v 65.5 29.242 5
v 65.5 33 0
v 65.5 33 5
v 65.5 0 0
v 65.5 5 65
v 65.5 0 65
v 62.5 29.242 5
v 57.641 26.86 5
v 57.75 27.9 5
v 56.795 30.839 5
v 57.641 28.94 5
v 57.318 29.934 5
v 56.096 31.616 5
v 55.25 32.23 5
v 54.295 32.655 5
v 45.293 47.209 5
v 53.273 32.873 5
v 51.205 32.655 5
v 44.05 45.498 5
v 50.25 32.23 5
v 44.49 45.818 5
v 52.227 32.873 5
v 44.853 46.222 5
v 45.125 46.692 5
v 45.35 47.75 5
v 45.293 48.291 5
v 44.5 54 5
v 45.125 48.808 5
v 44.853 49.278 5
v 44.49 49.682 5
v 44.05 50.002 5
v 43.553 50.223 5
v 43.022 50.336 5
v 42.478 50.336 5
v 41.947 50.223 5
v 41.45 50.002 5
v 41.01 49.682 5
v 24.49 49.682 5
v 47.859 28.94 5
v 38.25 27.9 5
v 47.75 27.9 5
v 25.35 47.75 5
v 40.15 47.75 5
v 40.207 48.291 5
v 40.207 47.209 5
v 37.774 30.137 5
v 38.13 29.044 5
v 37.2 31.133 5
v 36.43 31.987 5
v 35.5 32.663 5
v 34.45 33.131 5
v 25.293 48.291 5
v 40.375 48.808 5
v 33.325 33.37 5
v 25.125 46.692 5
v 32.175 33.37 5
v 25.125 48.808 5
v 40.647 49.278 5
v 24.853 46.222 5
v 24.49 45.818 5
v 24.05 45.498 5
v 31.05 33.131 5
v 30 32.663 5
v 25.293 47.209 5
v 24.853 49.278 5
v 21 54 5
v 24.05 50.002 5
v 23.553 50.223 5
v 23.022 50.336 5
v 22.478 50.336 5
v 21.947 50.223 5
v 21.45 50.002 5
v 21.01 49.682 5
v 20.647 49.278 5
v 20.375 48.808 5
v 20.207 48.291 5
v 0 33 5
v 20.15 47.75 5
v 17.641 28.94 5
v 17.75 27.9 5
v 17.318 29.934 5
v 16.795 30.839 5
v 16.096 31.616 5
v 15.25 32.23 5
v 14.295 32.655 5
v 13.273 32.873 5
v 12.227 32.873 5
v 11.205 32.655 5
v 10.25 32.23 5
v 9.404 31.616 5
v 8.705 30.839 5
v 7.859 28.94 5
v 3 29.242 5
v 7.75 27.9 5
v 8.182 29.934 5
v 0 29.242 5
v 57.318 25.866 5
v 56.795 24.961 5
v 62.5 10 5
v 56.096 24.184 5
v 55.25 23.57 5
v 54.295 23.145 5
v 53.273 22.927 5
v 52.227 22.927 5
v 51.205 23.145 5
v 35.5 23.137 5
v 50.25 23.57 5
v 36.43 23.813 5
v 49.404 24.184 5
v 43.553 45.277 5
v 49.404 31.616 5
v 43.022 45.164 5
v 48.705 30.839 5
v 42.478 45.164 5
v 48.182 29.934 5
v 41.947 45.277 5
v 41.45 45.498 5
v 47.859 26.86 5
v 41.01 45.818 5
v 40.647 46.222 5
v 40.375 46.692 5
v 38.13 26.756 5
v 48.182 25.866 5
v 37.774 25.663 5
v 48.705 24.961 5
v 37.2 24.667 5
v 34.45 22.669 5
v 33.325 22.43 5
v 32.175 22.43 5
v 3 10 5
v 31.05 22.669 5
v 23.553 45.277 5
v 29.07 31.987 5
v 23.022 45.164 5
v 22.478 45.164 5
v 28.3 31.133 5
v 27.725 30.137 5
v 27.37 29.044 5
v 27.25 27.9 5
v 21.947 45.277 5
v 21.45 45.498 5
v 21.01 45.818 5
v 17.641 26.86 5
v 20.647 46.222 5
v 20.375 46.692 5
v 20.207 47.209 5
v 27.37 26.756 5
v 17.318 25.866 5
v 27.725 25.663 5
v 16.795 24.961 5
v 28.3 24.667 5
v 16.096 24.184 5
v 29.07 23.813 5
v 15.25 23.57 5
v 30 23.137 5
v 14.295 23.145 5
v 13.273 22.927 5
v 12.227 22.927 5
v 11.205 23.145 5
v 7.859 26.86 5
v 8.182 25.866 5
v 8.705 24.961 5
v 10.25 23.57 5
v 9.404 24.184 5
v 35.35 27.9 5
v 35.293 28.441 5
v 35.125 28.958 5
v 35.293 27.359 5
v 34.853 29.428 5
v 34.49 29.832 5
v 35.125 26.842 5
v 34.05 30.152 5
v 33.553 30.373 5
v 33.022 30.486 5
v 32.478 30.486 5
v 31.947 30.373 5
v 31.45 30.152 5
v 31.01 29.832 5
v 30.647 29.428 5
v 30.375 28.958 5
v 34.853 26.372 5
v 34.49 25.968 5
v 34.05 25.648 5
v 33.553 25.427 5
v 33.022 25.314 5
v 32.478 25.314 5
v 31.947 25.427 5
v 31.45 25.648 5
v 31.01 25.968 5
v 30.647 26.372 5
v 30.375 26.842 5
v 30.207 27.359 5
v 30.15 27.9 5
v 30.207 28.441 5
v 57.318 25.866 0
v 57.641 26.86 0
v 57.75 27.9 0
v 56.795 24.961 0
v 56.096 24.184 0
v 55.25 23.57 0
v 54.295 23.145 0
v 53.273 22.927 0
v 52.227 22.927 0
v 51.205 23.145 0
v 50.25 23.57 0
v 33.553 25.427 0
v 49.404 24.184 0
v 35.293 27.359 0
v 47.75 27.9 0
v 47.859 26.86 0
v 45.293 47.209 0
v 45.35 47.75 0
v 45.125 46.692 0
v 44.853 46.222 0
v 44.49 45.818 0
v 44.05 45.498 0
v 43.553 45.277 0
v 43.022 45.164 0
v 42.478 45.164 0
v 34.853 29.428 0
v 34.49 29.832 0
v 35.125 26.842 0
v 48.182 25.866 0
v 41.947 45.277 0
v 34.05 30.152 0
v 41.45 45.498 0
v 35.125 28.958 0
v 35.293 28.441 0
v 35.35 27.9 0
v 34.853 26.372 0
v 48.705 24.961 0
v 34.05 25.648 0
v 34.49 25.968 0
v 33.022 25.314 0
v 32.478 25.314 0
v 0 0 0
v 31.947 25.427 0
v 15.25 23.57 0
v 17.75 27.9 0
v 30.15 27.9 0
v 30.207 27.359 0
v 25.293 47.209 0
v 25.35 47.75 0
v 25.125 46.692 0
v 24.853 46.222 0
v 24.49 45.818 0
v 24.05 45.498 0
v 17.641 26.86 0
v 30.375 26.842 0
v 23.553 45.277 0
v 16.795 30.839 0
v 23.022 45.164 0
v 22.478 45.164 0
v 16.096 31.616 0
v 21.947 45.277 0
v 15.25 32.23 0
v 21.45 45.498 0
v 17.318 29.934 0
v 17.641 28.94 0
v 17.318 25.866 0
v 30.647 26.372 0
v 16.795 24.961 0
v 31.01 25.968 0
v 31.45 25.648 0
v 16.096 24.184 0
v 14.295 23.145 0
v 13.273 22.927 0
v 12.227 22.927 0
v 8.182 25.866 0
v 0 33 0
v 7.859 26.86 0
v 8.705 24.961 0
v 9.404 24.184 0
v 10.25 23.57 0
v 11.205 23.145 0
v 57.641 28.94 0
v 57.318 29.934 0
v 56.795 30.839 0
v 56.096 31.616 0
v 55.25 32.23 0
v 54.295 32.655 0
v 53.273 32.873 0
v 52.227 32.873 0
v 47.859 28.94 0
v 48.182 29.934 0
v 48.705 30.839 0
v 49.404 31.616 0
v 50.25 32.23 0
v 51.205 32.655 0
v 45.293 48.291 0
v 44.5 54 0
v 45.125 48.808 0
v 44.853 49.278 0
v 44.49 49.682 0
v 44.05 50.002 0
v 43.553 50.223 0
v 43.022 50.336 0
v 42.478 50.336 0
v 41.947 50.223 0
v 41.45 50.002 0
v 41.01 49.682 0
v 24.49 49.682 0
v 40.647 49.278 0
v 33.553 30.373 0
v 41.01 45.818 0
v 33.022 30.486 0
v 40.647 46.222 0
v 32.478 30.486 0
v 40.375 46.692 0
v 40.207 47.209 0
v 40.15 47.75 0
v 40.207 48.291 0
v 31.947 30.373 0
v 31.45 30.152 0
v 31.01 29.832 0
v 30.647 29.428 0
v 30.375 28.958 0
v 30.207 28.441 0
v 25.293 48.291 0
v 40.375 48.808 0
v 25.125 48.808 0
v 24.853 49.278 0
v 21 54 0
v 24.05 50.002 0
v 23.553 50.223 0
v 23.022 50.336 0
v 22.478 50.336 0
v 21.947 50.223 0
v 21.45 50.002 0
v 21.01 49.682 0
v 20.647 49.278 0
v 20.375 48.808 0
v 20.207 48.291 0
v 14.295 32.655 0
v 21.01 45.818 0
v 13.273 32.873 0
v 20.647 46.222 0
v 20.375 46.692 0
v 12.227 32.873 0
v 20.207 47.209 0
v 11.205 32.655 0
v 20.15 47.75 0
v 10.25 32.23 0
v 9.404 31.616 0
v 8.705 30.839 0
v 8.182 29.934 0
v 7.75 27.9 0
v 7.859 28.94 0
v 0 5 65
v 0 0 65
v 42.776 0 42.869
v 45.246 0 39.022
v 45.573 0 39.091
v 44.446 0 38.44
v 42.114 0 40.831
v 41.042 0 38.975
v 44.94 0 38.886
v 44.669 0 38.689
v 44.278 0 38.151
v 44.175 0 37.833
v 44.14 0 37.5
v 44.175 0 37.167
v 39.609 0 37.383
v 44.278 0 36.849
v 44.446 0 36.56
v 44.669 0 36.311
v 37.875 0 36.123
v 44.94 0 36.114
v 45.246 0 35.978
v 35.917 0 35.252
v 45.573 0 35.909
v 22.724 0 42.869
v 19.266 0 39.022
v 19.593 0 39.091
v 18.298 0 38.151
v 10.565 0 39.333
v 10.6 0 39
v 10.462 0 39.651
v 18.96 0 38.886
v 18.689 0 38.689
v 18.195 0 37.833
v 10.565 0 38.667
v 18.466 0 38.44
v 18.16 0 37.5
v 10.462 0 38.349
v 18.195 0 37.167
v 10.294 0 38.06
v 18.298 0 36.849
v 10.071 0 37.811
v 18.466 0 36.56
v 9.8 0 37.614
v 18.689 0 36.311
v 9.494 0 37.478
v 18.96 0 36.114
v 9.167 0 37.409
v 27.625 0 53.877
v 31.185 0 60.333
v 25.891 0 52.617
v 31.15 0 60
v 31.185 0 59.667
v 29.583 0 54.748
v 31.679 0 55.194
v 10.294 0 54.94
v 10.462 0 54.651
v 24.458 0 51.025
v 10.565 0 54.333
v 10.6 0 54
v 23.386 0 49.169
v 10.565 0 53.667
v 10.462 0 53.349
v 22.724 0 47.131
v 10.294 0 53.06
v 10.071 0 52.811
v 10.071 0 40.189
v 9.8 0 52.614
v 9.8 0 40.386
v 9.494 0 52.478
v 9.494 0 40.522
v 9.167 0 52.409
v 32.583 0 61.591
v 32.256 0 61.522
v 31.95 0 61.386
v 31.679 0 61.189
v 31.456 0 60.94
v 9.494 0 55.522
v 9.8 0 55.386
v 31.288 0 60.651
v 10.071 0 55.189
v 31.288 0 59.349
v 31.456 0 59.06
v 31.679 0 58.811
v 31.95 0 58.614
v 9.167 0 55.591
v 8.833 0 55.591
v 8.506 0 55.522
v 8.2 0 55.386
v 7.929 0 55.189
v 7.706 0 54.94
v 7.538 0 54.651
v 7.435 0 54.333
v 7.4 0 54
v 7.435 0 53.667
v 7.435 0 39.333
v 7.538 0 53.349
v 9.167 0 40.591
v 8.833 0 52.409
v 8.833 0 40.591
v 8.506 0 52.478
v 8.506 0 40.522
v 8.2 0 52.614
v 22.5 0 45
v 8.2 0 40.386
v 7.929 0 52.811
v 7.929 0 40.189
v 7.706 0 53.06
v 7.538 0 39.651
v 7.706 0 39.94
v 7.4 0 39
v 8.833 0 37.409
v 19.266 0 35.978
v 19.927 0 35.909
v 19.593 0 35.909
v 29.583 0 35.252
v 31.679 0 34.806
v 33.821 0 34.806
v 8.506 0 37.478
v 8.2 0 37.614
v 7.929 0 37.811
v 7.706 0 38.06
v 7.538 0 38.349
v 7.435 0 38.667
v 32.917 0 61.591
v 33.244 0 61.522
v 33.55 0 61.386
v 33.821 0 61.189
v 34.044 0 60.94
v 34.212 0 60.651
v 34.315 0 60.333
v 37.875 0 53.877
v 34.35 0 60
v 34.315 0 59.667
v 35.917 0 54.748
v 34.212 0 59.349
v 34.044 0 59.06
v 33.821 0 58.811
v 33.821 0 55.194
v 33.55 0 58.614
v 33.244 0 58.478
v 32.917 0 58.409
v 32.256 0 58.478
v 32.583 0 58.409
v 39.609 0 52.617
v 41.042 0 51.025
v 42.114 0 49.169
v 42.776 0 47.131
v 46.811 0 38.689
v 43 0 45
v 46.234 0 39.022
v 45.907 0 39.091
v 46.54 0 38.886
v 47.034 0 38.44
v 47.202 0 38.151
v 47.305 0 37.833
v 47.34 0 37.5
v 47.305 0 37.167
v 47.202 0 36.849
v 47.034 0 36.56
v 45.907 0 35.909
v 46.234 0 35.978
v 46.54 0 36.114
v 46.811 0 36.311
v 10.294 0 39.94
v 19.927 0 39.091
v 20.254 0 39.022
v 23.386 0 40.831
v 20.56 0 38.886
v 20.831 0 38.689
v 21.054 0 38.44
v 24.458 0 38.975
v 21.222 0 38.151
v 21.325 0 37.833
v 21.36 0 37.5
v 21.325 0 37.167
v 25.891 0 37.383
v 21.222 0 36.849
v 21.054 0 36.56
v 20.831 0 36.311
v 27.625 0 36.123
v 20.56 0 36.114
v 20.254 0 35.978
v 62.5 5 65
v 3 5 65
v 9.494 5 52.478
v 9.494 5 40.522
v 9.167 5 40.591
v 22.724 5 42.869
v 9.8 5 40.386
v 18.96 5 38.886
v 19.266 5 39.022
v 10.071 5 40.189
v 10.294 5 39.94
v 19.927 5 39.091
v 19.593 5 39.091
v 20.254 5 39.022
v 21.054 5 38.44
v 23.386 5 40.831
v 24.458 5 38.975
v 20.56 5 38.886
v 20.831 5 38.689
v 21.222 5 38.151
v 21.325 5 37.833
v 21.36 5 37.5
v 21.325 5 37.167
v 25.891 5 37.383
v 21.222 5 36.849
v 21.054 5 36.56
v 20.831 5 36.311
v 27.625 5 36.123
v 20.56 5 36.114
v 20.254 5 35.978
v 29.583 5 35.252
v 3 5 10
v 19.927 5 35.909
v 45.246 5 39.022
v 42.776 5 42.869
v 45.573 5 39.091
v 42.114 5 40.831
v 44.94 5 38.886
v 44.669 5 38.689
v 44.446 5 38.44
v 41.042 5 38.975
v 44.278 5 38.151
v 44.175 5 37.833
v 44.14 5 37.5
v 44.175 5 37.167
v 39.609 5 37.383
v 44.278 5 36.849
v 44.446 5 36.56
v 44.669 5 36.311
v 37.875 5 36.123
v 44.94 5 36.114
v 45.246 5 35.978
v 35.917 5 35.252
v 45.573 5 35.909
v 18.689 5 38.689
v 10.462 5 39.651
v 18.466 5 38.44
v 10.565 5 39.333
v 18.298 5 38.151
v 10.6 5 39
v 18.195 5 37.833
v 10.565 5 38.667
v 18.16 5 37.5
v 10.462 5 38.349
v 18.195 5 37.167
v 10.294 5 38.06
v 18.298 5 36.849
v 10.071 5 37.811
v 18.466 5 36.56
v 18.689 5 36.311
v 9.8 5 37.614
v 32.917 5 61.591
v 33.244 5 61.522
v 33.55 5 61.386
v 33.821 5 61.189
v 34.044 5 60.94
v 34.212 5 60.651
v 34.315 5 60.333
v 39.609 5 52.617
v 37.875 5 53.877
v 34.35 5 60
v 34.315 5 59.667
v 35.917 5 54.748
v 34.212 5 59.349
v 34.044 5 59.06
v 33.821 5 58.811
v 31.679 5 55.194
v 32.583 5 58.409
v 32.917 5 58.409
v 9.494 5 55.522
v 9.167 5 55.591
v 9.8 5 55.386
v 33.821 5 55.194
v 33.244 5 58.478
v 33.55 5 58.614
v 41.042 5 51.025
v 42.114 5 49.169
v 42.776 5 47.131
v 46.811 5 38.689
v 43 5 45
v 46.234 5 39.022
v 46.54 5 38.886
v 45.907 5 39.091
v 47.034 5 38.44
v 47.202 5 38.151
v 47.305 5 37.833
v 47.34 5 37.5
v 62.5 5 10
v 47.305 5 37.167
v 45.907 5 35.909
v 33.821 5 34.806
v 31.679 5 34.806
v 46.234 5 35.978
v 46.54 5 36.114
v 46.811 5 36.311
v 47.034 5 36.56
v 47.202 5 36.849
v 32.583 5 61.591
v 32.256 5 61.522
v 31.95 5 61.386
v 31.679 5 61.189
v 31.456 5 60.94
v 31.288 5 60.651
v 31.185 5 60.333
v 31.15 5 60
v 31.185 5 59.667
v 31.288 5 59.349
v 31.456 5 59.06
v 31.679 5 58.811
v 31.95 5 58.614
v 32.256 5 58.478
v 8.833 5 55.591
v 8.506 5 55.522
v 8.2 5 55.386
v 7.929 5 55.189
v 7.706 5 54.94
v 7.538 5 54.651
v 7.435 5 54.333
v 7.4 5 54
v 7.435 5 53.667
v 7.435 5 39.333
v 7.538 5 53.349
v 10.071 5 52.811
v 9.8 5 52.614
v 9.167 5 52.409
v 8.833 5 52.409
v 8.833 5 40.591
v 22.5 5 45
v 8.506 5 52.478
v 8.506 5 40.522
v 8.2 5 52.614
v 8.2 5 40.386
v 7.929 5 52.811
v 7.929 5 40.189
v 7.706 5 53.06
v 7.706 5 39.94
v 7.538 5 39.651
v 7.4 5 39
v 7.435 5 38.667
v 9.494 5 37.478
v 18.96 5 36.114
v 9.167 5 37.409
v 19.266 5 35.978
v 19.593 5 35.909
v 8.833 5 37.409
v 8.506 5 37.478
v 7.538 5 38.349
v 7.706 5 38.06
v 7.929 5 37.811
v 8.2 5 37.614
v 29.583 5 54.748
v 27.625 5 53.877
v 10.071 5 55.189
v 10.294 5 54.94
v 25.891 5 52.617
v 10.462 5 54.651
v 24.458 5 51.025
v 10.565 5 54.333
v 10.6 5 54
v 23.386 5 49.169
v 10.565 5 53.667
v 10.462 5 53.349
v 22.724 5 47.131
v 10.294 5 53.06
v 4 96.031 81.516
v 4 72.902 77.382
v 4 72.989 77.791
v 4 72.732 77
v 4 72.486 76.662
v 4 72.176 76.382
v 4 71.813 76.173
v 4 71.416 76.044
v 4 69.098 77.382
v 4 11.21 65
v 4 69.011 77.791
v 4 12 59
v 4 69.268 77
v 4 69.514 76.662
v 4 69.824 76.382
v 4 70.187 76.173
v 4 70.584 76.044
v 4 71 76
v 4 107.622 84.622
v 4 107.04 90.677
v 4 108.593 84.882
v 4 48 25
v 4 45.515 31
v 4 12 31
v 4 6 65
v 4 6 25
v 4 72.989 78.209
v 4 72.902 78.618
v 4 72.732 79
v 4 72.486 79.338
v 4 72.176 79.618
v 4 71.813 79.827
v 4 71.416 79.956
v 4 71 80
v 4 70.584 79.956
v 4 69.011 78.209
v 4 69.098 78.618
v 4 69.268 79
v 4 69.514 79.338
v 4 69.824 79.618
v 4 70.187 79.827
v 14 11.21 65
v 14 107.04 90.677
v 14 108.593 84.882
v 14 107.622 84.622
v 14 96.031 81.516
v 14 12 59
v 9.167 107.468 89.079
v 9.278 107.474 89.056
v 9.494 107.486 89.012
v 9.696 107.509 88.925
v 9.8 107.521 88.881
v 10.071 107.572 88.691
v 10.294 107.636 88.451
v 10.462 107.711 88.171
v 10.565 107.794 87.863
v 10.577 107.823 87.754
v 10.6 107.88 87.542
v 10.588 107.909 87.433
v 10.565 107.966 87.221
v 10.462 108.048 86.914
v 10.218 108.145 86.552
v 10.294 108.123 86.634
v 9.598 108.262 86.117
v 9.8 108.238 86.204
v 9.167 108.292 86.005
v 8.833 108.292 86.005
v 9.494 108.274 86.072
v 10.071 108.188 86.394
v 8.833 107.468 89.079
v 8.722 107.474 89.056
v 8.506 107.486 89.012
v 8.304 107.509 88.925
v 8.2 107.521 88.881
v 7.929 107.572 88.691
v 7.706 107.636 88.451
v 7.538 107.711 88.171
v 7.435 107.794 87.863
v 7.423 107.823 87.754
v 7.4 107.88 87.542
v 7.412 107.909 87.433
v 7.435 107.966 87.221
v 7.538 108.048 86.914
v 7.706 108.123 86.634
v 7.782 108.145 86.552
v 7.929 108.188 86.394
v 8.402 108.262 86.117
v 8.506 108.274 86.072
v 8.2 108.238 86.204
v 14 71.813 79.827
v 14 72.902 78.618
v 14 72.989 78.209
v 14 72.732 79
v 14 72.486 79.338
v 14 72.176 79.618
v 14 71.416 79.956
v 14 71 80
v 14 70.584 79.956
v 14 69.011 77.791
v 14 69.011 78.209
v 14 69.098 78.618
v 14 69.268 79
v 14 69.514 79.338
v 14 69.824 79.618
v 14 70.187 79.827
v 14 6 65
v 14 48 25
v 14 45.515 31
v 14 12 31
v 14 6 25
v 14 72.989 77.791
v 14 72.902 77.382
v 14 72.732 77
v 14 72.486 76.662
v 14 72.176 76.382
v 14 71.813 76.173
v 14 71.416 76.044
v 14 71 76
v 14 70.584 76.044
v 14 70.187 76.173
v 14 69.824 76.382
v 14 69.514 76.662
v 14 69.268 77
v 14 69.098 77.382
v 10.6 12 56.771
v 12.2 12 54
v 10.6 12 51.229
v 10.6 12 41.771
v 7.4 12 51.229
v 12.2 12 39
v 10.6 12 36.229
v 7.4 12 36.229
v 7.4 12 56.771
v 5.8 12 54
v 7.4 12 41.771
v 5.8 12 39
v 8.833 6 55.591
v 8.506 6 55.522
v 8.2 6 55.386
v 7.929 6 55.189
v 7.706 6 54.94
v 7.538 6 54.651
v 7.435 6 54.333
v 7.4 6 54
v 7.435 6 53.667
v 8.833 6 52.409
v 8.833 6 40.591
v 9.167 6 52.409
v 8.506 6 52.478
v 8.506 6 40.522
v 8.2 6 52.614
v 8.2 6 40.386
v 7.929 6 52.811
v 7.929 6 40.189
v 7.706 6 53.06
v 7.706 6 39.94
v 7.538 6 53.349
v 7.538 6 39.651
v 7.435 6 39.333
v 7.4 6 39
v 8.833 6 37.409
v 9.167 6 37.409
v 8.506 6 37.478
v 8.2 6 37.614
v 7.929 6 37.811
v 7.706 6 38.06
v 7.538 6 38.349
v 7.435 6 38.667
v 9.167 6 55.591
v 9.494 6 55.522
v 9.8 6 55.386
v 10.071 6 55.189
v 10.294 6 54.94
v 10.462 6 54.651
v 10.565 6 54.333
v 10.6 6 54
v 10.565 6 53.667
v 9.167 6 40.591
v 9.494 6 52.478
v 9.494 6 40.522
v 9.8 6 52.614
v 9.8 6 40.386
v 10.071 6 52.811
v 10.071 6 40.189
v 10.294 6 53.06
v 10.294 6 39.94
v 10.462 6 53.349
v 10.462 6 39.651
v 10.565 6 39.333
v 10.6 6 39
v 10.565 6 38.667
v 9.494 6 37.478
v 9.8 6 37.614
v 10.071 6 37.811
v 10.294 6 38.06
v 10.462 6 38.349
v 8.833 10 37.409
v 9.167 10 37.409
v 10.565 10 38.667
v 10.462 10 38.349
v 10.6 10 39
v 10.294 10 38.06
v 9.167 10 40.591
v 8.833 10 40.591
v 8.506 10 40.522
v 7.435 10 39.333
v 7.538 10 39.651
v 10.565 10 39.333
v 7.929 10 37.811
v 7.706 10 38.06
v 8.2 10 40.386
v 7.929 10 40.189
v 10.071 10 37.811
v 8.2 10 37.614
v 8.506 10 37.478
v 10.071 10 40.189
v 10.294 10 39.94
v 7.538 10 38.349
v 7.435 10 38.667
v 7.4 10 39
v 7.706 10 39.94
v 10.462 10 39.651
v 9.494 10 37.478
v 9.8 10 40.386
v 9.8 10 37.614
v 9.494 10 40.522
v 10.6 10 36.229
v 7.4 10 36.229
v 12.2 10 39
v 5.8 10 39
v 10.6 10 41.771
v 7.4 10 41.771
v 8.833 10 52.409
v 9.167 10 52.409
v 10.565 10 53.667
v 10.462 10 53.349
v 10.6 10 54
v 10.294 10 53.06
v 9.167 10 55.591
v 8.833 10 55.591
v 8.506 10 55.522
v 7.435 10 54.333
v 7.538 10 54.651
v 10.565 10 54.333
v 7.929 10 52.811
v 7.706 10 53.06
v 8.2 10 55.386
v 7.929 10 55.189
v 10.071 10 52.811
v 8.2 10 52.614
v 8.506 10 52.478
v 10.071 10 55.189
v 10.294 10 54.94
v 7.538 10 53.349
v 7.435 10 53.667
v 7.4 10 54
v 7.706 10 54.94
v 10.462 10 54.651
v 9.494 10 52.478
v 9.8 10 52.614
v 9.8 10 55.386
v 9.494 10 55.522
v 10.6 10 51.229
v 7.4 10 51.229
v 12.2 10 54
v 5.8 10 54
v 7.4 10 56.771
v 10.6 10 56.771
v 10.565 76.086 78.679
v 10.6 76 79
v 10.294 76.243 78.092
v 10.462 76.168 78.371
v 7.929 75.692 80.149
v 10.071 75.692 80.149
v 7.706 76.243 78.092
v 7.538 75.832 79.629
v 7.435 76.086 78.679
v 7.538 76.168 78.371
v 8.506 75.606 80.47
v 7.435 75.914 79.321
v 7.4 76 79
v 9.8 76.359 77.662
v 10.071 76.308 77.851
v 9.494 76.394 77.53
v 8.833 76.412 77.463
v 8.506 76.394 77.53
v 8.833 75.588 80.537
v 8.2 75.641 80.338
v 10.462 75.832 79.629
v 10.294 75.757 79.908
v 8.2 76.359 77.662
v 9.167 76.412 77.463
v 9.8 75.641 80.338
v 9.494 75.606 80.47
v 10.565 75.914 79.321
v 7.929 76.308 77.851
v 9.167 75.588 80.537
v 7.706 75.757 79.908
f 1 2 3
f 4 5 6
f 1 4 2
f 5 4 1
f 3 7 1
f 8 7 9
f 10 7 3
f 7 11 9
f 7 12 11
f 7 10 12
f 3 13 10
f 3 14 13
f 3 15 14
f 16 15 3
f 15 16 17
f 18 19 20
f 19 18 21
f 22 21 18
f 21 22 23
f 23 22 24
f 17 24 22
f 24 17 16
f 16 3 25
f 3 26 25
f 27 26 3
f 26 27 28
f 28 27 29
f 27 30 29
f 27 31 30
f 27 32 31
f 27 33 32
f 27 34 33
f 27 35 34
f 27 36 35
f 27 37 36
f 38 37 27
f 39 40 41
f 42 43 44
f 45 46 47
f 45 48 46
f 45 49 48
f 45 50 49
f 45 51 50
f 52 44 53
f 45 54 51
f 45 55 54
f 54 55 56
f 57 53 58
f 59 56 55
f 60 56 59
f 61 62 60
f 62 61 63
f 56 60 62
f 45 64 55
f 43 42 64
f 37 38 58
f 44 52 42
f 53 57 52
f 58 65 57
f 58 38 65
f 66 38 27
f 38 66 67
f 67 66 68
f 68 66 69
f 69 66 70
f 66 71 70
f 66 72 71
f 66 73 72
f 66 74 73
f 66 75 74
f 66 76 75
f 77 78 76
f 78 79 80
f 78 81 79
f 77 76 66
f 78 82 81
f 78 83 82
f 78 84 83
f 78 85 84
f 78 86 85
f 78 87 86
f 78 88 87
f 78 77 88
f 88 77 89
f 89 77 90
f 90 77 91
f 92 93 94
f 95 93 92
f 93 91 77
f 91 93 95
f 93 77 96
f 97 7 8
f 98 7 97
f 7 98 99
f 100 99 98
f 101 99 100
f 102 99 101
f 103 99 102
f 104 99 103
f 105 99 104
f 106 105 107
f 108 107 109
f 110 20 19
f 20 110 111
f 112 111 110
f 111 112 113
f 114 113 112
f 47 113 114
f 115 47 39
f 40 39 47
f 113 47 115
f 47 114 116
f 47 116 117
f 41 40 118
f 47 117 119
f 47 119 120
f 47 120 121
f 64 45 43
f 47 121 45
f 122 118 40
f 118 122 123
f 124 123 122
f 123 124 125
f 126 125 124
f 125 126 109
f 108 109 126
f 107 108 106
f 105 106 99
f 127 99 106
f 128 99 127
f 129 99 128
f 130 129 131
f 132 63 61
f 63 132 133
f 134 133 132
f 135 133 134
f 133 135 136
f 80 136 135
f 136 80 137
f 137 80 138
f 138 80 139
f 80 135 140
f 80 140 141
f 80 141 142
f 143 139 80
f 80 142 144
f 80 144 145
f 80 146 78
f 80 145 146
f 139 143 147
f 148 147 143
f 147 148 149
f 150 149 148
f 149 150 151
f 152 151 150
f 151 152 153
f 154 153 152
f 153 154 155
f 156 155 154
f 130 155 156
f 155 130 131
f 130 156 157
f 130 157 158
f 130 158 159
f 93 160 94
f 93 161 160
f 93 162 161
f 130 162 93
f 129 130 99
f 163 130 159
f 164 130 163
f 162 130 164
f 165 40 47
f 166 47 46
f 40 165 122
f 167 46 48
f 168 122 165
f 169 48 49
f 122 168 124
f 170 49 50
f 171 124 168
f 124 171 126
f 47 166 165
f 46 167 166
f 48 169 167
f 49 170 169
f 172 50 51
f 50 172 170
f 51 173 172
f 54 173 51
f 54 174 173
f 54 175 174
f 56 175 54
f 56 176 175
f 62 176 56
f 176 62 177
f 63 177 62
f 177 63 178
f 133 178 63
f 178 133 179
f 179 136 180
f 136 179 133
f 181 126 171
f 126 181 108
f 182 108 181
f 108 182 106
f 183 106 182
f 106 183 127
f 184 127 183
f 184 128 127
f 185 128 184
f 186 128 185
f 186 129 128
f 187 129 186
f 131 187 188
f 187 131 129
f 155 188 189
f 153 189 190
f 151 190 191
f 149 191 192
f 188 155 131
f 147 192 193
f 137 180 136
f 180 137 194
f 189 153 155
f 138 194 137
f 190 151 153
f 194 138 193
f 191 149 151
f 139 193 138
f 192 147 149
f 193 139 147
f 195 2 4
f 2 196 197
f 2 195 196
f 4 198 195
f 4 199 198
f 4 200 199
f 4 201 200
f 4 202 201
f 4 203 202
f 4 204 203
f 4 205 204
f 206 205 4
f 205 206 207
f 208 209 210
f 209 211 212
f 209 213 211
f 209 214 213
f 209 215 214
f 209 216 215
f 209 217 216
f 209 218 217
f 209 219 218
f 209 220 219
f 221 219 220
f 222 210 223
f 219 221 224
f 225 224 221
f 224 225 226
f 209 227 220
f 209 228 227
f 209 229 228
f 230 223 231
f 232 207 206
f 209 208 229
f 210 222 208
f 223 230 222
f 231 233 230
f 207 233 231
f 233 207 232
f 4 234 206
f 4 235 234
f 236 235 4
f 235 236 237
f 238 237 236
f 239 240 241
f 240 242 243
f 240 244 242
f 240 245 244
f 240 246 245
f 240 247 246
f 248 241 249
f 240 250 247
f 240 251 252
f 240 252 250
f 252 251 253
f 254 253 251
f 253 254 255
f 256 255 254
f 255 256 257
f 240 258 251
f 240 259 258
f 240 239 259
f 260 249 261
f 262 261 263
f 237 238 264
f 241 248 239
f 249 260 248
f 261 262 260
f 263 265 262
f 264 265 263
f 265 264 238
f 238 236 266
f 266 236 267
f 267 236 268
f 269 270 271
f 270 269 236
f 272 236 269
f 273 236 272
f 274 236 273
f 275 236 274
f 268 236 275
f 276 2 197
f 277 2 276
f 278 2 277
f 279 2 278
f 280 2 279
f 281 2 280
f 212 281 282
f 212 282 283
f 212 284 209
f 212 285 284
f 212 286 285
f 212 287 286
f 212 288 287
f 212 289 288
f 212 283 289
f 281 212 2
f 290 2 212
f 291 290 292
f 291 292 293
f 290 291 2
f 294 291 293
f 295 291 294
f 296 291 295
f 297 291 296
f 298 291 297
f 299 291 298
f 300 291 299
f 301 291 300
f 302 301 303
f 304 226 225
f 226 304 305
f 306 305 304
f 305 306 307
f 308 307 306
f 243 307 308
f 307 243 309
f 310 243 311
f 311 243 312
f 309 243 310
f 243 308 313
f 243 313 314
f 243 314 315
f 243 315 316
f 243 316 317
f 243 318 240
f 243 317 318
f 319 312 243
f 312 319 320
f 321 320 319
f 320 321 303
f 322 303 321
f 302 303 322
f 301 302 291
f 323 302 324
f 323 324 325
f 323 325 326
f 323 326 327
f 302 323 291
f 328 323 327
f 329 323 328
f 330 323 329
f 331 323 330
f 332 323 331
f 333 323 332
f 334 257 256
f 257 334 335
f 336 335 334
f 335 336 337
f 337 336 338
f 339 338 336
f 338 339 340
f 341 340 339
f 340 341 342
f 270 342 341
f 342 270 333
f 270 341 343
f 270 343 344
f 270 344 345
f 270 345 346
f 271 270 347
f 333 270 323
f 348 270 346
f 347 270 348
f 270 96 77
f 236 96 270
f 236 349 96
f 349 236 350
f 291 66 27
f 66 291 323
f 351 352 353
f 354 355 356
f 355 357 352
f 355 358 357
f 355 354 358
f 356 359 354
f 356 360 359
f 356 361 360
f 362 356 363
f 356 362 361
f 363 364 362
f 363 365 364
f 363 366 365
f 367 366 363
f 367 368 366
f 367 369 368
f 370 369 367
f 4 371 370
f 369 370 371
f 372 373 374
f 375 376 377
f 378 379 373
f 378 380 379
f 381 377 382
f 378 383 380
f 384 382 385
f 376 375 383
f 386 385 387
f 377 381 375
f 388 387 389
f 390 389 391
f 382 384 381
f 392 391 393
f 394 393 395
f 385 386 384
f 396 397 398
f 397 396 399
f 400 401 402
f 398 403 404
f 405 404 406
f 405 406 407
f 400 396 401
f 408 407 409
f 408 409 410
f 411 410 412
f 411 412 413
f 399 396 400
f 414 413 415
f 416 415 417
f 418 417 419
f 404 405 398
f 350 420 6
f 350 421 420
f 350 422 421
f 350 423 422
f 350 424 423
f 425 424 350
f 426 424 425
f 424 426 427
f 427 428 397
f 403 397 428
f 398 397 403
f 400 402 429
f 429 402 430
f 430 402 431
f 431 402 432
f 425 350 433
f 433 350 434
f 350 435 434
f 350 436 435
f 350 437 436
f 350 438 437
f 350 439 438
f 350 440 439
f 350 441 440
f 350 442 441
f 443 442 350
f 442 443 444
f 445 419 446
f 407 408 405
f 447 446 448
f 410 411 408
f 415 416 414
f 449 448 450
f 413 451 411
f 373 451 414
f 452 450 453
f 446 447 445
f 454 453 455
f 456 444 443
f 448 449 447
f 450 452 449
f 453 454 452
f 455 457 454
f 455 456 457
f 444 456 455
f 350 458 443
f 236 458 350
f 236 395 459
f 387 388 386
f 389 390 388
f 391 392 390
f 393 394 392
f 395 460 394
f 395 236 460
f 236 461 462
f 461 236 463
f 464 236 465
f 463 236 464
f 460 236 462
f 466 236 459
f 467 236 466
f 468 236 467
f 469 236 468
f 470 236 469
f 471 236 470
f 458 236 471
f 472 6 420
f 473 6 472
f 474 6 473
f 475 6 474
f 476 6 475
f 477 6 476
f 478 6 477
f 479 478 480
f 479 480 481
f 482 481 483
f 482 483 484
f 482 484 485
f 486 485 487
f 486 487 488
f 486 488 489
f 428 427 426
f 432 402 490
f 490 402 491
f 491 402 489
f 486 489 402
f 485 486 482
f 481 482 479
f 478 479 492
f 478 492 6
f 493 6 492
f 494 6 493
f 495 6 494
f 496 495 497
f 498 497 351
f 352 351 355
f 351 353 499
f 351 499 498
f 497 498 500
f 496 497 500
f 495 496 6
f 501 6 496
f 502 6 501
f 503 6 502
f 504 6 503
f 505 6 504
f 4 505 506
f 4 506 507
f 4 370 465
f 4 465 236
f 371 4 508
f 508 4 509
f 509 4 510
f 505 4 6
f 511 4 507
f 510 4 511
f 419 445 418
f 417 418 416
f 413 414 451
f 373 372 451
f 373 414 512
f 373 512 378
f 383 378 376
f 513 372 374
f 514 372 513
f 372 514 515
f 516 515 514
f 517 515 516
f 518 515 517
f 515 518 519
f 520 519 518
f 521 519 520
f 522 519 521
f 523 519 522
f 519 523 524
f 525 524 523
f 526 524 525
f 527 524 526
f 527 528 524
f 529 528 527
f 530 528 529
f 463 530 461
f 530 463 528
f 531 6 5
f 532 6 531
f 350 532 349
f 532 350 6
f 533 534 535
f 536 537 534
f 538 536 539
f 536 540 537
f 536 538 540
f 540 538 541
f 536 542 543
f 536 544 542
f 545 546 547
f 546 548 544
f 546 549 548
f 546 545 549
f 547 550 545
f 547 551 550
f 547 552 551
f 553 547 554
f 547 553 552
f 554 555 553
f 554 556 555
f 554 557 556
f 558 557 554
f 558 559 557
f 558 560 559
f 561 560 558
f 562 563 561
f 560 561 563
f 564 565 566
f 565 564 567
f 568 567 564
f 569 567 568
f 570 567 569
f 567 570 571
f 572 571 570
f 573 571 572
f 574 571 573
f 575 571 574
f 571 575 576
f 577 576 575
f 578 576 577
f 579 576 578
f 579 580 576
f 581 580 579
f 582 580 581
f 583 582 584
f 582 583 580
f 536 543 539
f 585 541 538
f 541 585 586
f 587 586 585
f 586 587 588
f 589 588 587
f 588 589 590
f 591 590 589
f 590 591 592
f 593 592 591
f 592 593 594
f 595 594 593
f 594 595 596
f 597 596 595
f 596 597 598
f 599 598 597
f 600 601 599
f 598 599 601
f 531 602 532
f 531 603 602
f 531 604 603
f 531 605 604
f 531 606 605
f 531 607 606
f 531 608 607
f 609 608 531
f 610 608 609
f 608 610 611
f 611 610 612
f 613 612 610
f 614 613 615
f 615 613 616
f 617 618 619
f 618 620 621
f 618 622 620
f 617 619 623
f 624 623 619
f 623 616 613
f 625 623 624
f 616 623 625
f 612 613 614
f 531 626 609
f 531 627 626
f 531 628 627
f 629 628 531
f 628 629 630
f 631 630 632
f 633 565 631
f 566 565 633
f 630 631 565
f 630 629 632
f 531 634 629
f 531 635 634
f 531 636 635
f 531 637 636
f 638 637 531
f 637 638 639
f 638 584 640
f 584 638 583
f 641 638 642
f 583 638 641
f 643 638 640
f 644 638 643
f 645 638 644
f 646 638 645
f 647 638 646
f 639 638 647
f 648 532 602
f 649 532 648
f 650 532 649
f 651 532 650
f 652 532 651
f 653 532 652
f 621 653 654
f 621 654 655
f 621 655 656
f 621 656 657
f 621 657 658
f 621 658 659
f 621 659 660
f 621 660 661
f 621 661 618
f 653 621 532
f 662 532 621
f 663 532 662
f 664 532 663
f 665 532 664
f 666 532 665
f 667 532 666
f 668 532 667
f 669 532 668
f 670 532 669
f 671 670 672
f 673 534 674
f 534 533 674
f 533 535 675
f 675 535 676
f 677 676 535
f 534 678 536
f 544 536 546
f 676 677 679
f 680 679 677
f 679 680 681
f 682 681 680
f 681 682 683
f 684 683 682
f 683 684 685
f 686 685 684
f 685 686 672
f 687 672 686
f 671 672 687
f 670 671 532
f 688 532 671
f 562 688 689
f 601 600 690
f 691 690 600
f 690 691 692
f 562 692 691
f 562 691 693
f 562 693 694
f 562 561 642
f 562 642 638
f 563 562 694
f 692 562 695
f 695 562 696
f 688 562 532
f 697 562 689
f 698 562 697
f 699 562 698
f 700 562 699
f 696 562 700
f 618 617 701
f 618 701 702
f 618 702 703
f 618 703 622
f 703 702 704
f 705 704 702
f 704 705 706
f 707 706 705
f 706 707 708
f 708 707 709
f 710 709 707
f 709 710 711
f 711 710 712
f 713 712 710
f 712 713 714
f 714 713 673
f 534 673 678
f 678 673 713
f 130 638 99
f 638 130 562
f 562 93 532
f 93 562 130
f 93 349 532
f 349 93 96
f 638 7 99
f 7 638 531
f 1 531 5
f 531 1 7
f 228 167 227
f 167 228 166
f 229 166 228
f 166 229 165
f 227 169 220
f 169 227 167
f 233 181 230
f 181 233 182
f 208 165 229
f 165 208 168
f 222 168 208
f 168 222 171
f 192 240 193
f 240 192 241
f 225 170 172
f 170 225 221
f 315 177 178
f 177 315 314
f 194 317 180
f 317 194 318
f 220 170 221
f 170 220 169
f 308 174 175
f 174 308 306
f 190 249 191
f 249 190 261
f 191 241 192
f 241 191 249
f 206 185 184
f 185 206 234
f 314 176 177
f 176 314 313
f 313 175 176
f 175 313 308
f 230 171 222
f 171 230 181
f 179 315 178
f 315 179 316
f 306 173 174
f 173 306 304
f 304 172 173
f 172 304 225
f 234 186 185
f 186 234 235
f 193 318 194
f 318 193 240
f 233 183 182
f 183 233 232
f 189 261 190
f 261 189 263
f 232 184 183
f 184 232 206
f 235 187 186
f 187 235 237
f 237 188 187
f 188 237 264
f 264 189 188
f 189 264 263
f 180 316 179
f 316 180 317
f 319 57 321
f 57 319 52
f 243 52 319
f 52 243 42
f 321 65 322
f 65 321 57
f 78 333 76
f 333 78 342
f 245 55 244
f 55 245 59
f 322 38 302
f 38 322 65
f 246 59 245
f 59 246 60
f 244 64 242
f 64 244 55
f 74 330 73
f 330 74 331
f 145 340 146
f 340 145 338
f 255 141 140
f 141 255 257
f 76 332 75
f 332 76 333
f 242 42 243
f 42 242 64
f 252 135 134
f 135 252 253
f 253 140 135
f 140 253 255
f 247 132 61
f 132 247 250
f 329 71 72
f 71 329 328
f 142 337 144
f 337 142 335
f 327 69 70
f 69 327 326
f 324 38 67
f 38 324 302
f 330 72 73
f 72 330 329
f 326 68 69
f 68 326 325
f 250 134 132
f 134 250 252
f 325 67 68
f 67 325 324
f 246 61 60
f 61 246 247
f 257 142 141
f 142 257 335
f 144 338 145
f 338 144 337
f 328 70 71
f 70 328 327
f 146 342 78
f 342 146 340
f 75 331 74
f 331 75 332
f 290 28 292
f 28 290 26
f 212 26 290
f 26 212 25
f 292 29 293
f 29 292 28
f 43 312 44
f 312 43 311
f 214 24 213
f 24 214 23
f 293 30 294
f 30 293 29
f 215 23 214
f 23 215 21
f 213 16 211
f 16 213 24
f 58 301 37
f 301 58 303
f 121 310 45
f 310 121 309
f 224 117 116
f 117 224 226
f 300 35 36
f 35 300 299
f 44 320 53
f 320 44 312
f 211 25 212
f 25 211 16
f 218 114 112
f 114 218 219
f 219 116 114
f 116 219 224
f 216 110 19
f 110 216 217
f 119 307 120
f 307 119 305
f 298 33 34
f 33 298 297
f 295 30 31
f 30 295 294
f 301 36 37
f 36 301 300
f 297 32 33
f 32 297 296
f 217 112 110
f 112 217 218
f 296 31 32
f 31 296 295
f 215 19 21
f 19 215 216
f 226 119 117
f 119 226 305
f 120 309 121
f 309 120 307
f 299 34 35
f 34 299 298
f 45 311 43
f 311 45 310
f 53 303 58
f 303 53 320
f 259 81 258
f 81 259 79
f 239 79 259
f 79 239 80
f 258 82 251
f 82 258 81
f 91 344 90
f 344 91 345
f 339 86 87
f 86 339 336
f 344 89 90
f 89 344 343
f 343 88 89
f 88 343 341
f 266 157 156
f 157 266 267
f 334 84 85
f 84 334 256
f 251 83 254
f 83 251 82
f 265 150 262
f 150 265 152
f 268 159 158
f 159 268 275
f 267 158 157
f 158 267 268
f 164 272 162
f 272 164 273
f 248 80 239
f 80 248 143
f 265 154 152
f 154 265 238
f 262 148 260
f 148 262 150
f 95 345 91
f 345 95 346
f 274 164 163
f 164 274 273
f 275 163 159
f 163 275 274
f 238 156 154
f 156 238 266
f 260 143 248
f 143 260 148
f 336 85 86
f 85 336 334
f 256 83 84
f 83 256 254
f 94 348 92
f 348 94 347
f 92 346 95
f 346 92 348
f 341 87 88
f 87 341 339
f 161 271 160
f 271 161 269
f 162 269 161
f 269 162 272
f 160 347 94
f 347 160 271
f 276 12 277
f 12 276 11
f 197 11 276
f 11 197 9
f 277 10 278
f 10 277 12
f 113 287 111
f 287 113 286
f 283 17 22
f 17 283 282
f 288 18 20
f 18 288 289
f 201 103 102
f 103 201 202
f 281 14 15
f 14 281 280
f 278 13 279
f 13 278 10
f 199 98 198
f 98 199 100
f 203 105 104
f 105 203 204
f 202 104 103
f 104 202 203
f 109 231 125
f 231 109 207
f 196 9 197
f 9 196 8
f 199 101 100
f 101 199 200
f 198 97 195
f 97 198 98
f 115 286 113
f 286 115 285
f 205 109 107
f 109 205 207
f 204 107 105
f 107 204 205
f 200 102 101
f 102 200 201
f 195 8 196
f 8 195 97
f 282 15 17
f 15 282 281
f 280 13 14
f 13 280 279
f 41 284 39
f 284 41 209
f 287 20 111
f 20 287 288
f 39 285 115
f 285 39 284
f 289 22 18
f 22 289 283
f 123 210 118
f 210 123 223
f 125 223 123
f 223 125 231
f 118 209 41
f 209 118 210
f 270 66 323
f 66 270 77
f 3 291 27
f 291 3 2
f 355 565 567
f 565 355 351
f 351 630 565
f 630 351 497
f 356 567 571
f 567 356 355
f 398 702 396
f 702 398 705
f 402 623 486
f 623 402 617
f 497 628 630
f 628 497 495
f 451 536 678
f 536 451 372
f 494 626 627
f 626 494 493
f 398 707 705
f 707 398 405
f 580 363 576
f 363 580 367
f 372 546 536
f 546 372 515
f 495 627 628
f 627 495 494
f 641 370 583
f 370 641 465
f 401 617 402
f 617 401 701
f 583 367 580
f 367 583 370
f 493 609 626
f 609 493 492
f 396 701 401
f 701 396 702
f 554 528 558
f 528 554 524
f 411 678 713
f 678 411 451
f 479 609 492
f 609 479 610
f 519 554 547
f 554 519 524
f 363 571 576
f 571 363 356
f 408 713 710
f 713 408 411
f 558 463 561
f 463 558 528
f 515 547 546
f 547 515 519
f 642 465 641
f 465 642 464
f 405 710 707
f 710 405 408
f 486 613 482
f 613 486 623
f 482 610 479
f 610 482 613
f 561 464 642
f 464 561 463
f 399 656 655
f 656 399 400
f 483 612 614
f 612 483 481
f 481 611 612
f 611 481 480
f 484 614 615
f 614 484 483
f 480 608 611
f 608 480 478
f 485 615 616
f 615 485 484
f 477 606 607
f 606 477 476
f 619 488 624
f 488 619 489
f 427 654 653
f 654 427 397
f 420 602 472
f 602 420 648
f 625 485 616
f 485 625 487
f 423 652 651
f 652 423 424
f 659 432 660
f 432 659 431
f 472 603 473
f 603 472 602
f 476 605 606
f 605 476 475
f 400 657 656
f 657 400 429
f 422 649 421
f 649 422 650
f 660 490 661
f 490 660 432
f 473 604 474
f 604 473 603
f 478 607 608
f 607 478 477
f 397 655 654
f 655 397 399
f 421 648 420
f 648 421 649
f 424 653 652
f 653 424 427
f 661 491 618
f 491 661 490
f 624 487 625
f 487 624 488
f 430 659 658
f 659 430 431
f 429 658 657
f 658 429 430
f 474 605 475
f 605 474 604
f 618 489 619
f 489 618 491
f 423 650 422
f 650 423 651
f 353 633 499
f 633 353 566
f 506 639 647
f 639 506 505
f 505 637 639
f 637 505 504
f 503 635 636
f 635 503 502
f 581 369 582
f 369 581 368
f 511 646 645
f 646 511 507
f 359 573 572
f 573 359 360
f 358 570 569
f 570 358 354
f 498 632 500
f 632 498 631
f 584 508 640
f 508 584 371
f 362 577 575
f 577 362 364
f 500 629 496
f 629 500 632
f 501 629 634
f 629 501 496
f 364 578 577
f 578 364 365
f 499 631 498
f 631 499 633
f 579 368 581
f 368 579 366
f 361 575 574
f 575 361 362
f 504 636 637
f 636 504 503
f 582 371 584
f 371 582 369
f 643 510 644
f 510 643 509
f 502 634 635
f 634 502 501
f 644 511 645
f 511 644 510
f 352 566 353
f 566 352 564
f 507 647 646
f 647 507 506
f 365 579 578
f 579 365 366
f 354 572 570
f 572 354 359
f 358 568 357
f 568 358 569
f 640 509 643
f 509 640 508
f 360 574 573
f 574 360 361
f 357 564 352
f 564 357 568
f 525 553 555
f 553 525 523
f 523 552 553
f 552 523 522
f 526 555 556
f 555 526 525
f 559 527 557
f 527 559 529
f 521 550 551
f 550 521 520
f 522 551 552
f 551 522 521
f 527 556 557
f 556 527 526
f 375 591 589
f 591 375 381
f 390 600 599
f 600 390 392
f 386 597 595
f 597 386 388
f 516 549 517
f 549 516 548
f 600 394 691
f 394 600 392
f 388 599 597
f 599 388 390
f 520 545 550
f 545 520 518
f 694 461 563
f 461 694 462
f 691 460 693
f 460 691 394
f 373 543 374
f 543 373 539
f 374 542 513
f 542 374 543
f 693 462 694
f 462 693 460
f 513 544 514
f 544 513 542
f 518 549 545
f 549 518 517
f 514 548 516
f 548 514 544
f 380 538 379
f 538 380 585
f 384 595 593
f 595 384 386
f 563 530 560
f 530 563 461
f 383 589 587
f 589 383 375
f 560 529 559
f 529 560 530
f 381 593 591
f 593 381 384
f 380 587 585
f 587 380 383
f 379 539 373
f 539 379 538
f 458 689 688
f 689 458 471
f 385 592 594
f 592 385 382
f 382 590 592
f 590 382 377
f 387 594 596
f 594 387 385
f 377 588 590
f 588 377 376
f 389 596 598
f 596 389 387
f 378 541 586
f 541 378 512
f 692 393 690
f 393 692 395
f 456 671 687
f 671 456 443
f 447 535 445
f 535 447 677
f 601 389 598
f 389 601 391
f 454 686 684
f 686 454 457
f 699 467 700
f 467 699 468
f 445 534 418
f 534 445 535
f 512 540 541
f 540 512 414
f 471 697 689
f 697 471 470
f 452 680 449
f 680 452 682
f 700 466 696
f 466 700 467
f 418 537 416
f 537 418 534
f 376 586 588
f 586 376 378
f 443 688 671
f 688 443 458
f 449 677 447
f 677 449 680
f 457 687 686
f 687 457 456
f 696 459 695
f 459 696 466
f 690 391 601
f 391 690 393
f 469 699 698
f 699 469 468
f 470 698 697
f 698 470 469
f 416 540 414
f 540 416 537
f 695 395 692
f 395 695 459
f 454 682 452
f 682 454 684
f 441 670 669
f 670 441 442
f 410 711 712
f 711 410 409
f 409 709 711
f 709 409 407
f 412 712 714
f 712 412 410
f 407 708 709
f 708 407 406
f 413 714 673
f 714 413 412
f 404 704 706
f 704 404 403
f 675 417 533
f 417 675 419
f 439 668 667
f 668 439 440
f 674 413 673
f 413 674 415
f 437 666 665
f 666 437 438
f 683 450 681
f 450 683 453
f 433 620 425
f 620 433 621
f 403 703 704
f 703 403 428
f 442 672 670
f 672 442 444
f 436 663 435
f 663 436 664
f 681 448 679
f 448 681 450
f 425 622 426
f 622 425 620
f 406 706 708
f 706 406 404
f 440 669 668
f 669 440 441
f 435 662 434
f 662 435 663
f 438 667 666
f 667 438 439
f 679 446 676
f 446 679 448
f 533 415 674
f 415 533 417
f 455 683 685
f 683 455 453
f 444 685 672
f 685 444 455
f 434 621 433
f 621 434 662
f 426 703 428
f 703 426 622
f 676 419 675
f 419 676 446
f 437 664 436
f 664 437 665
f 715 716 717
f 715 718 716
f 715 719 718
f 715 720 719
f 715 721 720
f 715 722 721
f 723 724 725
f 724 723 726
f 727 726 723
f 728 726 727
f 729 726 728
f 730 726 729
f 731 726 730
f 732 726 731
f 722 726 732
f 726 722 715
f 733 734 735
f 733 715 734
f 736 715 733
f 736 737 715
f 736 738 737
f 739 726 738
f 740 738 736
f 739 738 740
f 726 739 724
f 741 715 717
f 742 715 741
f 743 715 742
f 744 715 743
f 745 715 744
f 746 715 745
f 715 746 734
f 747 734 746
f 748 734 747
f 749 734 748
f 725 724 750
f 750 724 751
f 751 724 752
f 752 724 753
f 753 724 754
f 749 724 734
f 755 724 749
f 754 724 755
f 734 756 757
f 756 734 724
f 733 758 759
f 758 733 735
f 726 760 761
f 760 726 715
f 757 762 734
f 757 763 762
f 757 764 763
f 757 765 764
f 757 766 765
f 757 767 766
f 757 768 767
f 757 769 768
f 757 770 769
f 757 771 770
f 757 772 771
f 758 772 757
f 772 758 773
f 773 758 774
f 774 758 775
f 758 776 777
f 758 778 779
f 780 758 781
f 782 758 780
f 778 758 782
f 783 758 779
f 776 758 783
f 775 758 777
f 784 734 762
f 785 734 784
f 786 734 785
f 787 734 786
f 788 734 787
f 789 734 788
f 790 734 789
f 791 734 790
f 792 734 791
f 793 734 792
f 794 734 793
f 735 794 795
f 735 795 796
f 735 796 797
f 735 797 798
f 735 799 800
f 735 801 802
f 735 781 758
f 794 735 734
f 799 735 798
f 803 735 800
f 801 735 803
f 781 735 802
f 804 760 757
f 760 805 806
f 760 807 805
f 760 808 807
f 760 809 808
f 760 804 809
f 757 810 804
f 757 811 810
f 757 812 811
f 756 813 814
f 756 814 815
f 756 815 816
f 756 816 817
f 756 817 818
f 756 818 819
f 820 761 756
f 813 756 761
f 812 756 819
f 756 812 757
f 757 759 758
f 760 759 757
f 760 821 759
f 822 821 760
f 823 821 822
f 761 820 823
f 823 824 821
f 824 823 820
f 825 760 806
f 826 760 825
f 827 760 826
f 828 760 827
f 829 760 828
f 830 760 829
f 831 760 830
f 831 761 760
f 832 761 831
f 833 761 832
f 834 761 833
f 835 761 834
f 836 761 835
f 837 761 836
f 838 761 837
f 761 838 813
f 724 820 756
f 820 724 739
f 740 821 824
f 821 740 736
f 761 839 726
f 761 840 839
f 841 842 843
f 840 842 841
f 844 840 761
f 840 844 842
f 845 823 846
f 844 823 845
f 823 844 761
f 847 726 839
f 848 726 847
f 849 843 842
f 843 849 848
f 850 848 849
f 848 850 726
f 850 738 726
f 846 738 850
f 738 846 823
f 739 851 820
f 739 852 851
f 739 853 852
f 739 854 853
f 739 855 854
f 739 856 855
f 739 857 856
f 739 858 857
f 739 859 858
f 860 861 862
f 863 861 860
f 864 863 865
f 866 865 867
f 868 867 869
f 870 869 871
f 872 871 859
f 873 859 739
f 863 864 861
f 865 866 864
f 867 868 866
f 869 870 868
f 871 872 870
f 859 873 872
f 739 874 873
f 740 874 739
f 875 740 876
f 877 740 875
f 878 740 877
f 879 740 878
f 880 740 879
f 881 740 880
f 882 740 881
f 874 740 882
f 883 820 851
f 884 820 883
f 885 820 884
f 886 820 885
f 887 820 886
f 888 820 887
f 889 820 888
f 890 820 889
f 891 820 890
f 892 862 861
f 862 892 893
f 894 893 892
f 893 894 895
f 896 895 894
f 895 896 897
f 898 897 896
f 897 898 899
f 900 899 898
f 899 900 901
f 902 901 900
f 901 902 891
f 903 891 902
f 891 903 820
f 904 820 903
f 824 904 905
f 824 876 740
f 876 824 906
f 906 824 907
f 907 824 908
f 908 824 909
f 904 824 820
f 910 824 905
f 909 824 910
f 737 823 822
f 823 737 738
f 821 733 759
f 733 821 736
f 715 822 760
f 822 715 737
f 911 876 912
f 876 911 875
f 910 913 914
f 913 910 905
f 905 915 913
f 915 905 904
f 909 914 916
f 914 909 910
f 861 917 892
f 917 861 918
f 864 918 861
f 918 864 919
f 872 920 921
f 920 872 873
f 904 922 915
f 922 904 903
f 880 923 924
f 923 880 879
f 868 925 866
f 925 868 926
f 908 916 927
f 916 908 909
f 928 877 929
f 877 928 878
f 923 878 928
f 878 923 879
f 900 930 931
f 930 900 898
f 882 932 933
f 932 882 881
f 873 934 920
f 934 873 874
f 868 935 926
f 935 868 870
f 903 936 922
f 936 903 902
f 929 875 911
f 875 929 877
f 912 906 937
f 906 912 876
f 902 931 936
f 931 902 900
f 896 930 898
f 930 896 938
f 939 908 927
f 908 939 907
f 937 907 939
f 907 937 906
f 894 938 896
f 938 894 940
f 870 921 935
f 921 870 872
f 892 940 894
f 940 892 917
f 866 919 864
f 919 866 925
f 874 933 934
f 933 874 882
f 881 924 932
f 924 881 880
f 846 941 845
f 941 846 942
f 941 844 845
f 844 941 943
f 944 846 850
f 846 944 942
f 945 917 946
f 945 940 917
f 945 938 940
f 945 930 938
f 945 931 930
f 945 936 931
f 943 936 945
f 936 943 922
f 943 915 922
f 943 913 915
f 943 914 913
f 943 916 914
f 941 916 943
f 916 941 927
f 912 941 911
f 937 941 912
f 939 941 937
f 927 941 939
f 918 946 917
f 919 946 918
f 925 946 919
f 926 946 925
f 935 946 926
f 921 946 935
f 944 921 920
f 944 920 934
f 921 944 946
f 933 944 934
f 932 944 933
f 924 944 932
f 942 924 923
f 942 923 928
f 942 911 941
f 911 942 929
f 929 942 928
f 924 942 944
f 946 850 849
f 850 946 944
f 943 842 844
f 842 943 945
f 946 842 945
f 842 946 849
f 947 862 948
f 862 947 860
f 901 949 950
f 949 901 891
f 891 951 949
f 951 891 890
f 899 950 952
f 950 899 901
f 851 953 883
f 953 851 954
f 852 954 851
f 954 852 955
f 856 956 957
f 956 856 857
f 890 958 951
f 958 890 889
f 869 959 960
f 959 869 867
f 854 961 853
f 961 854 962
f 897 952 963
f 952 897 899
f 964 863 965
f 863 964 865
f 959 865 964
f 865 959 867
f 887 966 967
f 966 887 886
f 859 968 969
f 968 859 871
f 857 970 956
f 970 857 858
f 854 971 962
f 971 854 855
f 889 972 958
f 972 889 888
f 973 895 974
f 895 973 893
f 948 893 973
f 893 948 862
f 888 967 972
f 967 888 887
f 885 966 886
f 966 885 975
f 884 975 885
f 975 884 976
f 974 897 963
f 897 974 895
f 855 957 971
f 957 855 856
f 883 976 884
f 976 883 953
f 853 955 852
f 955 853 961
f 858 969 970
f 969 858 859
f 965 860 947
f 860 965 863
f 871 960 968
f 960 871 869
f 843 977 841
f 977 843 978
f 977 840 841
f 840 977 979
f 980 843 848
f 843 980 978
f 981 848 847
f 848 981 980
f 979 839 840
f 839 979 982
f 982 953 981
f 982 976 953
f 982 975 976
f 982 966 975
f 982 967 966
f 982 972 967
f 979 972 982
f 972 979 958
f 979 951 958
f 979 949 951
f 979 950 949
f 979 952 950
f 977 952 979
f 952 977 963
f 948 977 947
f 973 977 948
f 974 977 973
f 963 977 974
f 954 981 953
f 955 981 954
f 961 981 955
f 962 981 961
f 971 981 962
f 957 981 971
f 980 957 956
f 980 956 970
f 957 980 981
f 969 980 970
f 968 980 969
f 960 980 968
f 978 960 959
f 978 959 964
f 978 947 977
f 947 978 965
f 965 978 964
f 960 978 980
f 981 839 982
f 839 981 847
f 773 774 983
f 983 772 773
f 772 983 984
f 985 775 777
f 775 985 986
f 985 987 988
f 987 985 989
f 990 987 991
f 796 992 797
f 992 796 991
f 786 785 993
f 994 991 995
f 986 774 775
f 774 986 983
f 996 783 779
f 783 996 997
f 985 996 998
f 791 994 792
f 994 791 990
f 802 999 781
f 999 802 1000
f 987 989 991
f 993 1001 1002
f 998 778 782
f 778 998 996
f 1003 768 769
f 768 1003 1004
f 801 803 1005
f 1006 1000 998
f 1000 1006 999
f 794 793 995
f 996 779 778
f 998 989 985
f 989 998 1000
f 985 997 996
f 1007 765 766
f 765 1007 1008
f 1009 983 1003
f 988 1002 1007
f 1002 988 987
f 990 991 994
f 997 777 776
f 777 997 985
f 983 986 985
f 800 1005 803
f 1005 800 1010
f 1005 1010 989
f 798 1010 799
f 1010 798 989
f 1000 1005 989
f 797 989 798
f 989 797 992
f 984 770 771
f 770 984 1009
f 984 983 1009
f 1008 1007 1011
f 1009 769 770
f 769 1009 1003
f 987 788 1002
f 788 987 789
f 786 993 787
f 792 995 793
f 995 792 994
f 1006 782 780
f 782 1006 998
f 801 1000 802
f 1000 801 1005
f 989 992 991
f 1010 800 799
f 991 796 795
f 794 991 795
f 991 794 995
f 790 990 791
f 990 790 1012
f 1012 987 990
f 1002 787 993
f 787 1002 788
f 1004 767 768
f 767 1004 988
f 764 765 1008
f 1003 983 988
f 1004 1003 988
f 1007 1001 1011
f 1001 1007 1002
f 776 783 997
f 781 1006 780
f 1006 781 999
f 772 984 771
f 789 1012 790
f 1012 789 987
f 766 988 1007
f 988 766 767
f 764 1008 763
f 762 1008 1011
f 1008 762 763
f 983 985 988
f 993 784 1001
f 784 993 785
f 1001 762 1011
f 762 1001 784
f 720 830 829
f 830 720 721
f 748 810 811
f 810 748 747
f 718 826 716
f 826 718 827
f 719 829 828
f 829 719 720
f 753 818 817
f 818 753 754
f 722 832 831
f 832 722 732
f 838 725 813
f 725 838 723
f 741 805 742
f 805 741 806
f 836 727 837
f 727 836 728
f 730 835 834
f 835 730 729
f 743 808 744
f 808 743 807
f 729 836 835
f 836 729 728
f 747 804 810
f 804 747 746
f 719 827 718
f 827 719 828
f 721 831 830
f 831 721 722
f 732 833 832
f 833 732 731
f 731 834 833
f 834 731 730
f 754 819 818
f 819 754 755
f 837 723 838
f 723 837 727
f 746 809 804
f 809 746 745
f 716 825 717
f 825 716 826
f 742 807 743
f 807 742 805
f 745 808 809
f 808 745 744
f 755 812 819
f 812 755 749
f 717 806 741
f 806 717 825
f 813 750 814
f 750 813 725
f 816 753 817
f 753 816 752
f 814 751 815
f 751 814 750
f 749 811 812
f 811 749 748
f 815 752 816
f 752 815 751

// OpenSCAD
$fn=30;

width=39+15;
length=65.5;
height=65;
screw_d=3.2;

sensor_mount();
translate([4,6,height-6]) sensor_cable_guide();


module sensor_cable_guide(){
    guide_length = 100; // Changing this value is not fully supported
    difference(){
        union(){
            translate([0,6,0]) rotate([15,0,0]) cube([10,guide_length,6]);
            translate([0,0,-34]) cube([10,6,40]);
            translate([0,0,-34]) cube([10,guide_length-64+6,6]);
            translate([0,6+guide_length-64,-34]) rotate([45,0,0]) cube([10,85,6]);
        }
        
        // Screwholes + nuts
        translate([5,-0.1,-20]) rotate([-90,0,0]) cylinder(h=10,d=screw_d);
        translate([5,4,-20]) rotate([-90,0,0]) cylinder(h = 4, r=3.2, $fn=6);
        translate([5,-0.1,-5]) rotate([-90,0,0]) cylinder(h=10,d=screw_d);
        translate([5,4,-5]) rotate([-90,0,0]) cylinder(h = 4, r=3.2, $fn=6); 
    
        
        // Filament hole
        translate([5,70,20]) rotate([-75,0,0]) cylinder(h=50,d=3.2);
        
        // Ziptie hole
        translate([-0.1,65,19.]) rotate([0,90,0]) cylinder(h=12,d=4);
           
    }
    
}
module sensor_mount(){
    difference(){
        union(){
            cube([length,width,5]);
            cube([length,5,height]);
            
            translate([0,10,5]) rotate([135,0,0]) cube([length,10,4]);
            
            // Stability sides
            translate([0,5,height]) rotate([22-180,0,0]) cube([3,25,height+10]);
            translate([length-3,5,height]) rotate([22-180,0,0]) cube([3,25,height+10]);
        }
    
        // Sensor Hole
        translate([length/2,-0.1,45]) rotate([-90,0,0]) cylinder(h=10,d=20.5);
        
        // Sensor Screw holes
        translate([length/2,-0.1,45+15]) rotate([-90,0,0]) cylinder(h=10,d=3.2);
        translate([length/2+12.99,-0.1,45-7.5]) rotate([-90,0,0]) cylinder(h=10,d=3.2);
        translate([length/2-12.99,-0.1,45-7.5]) rotate([-90,0,0]) cylinder(h=10,d=3.2);
        
        // Cable guide holes
        translate([9,-0.1,39]) rotate([-90,0,0]) cylinder(h=10,d=3.2);
        translate([9,-0.1,39+15]) rotate([-90,0,0]) cylinder(h=10,d=3.2);
        
    
        translate([0,15,0]){
        // Screwholes bottom
        translate([32.75,12.9,-0.1]) cylinder(h=10,d=5.2);
        translate([22.75,32.75,-0.1]) cylinder(h=10,d=5.2);      
        translate([42.75,32.75,-0.1]) cylinder(h=10,d=5.2);
        
        // Screwheads bottom
        translate([32.75,12.9,5]) cylinder(h=10,d=11);

        // Wheel Nut openings
        translate([12.75,12.9,-0.1]) cylinder(h=10,d=10);
        translate([length-12.75,12.9,-0.1]) cylinder(h=10,d=10);
            
        // 45° Cut bottom
        translate([0,18,-0.1]) rotate([0,0,45]) cube([30,20,6]);
        translate([length,18,-0.1]) rotate([0,0,45]) cube([20,30,6]);
            
        }

        
        //bottom and back cut
        translate([-0.1,-0.1,-length]) cube([length+1,width+1,length]);
        translate([-0.1,-length,-length]) cube([length+1,length,2*length]);
    
    }  
}
